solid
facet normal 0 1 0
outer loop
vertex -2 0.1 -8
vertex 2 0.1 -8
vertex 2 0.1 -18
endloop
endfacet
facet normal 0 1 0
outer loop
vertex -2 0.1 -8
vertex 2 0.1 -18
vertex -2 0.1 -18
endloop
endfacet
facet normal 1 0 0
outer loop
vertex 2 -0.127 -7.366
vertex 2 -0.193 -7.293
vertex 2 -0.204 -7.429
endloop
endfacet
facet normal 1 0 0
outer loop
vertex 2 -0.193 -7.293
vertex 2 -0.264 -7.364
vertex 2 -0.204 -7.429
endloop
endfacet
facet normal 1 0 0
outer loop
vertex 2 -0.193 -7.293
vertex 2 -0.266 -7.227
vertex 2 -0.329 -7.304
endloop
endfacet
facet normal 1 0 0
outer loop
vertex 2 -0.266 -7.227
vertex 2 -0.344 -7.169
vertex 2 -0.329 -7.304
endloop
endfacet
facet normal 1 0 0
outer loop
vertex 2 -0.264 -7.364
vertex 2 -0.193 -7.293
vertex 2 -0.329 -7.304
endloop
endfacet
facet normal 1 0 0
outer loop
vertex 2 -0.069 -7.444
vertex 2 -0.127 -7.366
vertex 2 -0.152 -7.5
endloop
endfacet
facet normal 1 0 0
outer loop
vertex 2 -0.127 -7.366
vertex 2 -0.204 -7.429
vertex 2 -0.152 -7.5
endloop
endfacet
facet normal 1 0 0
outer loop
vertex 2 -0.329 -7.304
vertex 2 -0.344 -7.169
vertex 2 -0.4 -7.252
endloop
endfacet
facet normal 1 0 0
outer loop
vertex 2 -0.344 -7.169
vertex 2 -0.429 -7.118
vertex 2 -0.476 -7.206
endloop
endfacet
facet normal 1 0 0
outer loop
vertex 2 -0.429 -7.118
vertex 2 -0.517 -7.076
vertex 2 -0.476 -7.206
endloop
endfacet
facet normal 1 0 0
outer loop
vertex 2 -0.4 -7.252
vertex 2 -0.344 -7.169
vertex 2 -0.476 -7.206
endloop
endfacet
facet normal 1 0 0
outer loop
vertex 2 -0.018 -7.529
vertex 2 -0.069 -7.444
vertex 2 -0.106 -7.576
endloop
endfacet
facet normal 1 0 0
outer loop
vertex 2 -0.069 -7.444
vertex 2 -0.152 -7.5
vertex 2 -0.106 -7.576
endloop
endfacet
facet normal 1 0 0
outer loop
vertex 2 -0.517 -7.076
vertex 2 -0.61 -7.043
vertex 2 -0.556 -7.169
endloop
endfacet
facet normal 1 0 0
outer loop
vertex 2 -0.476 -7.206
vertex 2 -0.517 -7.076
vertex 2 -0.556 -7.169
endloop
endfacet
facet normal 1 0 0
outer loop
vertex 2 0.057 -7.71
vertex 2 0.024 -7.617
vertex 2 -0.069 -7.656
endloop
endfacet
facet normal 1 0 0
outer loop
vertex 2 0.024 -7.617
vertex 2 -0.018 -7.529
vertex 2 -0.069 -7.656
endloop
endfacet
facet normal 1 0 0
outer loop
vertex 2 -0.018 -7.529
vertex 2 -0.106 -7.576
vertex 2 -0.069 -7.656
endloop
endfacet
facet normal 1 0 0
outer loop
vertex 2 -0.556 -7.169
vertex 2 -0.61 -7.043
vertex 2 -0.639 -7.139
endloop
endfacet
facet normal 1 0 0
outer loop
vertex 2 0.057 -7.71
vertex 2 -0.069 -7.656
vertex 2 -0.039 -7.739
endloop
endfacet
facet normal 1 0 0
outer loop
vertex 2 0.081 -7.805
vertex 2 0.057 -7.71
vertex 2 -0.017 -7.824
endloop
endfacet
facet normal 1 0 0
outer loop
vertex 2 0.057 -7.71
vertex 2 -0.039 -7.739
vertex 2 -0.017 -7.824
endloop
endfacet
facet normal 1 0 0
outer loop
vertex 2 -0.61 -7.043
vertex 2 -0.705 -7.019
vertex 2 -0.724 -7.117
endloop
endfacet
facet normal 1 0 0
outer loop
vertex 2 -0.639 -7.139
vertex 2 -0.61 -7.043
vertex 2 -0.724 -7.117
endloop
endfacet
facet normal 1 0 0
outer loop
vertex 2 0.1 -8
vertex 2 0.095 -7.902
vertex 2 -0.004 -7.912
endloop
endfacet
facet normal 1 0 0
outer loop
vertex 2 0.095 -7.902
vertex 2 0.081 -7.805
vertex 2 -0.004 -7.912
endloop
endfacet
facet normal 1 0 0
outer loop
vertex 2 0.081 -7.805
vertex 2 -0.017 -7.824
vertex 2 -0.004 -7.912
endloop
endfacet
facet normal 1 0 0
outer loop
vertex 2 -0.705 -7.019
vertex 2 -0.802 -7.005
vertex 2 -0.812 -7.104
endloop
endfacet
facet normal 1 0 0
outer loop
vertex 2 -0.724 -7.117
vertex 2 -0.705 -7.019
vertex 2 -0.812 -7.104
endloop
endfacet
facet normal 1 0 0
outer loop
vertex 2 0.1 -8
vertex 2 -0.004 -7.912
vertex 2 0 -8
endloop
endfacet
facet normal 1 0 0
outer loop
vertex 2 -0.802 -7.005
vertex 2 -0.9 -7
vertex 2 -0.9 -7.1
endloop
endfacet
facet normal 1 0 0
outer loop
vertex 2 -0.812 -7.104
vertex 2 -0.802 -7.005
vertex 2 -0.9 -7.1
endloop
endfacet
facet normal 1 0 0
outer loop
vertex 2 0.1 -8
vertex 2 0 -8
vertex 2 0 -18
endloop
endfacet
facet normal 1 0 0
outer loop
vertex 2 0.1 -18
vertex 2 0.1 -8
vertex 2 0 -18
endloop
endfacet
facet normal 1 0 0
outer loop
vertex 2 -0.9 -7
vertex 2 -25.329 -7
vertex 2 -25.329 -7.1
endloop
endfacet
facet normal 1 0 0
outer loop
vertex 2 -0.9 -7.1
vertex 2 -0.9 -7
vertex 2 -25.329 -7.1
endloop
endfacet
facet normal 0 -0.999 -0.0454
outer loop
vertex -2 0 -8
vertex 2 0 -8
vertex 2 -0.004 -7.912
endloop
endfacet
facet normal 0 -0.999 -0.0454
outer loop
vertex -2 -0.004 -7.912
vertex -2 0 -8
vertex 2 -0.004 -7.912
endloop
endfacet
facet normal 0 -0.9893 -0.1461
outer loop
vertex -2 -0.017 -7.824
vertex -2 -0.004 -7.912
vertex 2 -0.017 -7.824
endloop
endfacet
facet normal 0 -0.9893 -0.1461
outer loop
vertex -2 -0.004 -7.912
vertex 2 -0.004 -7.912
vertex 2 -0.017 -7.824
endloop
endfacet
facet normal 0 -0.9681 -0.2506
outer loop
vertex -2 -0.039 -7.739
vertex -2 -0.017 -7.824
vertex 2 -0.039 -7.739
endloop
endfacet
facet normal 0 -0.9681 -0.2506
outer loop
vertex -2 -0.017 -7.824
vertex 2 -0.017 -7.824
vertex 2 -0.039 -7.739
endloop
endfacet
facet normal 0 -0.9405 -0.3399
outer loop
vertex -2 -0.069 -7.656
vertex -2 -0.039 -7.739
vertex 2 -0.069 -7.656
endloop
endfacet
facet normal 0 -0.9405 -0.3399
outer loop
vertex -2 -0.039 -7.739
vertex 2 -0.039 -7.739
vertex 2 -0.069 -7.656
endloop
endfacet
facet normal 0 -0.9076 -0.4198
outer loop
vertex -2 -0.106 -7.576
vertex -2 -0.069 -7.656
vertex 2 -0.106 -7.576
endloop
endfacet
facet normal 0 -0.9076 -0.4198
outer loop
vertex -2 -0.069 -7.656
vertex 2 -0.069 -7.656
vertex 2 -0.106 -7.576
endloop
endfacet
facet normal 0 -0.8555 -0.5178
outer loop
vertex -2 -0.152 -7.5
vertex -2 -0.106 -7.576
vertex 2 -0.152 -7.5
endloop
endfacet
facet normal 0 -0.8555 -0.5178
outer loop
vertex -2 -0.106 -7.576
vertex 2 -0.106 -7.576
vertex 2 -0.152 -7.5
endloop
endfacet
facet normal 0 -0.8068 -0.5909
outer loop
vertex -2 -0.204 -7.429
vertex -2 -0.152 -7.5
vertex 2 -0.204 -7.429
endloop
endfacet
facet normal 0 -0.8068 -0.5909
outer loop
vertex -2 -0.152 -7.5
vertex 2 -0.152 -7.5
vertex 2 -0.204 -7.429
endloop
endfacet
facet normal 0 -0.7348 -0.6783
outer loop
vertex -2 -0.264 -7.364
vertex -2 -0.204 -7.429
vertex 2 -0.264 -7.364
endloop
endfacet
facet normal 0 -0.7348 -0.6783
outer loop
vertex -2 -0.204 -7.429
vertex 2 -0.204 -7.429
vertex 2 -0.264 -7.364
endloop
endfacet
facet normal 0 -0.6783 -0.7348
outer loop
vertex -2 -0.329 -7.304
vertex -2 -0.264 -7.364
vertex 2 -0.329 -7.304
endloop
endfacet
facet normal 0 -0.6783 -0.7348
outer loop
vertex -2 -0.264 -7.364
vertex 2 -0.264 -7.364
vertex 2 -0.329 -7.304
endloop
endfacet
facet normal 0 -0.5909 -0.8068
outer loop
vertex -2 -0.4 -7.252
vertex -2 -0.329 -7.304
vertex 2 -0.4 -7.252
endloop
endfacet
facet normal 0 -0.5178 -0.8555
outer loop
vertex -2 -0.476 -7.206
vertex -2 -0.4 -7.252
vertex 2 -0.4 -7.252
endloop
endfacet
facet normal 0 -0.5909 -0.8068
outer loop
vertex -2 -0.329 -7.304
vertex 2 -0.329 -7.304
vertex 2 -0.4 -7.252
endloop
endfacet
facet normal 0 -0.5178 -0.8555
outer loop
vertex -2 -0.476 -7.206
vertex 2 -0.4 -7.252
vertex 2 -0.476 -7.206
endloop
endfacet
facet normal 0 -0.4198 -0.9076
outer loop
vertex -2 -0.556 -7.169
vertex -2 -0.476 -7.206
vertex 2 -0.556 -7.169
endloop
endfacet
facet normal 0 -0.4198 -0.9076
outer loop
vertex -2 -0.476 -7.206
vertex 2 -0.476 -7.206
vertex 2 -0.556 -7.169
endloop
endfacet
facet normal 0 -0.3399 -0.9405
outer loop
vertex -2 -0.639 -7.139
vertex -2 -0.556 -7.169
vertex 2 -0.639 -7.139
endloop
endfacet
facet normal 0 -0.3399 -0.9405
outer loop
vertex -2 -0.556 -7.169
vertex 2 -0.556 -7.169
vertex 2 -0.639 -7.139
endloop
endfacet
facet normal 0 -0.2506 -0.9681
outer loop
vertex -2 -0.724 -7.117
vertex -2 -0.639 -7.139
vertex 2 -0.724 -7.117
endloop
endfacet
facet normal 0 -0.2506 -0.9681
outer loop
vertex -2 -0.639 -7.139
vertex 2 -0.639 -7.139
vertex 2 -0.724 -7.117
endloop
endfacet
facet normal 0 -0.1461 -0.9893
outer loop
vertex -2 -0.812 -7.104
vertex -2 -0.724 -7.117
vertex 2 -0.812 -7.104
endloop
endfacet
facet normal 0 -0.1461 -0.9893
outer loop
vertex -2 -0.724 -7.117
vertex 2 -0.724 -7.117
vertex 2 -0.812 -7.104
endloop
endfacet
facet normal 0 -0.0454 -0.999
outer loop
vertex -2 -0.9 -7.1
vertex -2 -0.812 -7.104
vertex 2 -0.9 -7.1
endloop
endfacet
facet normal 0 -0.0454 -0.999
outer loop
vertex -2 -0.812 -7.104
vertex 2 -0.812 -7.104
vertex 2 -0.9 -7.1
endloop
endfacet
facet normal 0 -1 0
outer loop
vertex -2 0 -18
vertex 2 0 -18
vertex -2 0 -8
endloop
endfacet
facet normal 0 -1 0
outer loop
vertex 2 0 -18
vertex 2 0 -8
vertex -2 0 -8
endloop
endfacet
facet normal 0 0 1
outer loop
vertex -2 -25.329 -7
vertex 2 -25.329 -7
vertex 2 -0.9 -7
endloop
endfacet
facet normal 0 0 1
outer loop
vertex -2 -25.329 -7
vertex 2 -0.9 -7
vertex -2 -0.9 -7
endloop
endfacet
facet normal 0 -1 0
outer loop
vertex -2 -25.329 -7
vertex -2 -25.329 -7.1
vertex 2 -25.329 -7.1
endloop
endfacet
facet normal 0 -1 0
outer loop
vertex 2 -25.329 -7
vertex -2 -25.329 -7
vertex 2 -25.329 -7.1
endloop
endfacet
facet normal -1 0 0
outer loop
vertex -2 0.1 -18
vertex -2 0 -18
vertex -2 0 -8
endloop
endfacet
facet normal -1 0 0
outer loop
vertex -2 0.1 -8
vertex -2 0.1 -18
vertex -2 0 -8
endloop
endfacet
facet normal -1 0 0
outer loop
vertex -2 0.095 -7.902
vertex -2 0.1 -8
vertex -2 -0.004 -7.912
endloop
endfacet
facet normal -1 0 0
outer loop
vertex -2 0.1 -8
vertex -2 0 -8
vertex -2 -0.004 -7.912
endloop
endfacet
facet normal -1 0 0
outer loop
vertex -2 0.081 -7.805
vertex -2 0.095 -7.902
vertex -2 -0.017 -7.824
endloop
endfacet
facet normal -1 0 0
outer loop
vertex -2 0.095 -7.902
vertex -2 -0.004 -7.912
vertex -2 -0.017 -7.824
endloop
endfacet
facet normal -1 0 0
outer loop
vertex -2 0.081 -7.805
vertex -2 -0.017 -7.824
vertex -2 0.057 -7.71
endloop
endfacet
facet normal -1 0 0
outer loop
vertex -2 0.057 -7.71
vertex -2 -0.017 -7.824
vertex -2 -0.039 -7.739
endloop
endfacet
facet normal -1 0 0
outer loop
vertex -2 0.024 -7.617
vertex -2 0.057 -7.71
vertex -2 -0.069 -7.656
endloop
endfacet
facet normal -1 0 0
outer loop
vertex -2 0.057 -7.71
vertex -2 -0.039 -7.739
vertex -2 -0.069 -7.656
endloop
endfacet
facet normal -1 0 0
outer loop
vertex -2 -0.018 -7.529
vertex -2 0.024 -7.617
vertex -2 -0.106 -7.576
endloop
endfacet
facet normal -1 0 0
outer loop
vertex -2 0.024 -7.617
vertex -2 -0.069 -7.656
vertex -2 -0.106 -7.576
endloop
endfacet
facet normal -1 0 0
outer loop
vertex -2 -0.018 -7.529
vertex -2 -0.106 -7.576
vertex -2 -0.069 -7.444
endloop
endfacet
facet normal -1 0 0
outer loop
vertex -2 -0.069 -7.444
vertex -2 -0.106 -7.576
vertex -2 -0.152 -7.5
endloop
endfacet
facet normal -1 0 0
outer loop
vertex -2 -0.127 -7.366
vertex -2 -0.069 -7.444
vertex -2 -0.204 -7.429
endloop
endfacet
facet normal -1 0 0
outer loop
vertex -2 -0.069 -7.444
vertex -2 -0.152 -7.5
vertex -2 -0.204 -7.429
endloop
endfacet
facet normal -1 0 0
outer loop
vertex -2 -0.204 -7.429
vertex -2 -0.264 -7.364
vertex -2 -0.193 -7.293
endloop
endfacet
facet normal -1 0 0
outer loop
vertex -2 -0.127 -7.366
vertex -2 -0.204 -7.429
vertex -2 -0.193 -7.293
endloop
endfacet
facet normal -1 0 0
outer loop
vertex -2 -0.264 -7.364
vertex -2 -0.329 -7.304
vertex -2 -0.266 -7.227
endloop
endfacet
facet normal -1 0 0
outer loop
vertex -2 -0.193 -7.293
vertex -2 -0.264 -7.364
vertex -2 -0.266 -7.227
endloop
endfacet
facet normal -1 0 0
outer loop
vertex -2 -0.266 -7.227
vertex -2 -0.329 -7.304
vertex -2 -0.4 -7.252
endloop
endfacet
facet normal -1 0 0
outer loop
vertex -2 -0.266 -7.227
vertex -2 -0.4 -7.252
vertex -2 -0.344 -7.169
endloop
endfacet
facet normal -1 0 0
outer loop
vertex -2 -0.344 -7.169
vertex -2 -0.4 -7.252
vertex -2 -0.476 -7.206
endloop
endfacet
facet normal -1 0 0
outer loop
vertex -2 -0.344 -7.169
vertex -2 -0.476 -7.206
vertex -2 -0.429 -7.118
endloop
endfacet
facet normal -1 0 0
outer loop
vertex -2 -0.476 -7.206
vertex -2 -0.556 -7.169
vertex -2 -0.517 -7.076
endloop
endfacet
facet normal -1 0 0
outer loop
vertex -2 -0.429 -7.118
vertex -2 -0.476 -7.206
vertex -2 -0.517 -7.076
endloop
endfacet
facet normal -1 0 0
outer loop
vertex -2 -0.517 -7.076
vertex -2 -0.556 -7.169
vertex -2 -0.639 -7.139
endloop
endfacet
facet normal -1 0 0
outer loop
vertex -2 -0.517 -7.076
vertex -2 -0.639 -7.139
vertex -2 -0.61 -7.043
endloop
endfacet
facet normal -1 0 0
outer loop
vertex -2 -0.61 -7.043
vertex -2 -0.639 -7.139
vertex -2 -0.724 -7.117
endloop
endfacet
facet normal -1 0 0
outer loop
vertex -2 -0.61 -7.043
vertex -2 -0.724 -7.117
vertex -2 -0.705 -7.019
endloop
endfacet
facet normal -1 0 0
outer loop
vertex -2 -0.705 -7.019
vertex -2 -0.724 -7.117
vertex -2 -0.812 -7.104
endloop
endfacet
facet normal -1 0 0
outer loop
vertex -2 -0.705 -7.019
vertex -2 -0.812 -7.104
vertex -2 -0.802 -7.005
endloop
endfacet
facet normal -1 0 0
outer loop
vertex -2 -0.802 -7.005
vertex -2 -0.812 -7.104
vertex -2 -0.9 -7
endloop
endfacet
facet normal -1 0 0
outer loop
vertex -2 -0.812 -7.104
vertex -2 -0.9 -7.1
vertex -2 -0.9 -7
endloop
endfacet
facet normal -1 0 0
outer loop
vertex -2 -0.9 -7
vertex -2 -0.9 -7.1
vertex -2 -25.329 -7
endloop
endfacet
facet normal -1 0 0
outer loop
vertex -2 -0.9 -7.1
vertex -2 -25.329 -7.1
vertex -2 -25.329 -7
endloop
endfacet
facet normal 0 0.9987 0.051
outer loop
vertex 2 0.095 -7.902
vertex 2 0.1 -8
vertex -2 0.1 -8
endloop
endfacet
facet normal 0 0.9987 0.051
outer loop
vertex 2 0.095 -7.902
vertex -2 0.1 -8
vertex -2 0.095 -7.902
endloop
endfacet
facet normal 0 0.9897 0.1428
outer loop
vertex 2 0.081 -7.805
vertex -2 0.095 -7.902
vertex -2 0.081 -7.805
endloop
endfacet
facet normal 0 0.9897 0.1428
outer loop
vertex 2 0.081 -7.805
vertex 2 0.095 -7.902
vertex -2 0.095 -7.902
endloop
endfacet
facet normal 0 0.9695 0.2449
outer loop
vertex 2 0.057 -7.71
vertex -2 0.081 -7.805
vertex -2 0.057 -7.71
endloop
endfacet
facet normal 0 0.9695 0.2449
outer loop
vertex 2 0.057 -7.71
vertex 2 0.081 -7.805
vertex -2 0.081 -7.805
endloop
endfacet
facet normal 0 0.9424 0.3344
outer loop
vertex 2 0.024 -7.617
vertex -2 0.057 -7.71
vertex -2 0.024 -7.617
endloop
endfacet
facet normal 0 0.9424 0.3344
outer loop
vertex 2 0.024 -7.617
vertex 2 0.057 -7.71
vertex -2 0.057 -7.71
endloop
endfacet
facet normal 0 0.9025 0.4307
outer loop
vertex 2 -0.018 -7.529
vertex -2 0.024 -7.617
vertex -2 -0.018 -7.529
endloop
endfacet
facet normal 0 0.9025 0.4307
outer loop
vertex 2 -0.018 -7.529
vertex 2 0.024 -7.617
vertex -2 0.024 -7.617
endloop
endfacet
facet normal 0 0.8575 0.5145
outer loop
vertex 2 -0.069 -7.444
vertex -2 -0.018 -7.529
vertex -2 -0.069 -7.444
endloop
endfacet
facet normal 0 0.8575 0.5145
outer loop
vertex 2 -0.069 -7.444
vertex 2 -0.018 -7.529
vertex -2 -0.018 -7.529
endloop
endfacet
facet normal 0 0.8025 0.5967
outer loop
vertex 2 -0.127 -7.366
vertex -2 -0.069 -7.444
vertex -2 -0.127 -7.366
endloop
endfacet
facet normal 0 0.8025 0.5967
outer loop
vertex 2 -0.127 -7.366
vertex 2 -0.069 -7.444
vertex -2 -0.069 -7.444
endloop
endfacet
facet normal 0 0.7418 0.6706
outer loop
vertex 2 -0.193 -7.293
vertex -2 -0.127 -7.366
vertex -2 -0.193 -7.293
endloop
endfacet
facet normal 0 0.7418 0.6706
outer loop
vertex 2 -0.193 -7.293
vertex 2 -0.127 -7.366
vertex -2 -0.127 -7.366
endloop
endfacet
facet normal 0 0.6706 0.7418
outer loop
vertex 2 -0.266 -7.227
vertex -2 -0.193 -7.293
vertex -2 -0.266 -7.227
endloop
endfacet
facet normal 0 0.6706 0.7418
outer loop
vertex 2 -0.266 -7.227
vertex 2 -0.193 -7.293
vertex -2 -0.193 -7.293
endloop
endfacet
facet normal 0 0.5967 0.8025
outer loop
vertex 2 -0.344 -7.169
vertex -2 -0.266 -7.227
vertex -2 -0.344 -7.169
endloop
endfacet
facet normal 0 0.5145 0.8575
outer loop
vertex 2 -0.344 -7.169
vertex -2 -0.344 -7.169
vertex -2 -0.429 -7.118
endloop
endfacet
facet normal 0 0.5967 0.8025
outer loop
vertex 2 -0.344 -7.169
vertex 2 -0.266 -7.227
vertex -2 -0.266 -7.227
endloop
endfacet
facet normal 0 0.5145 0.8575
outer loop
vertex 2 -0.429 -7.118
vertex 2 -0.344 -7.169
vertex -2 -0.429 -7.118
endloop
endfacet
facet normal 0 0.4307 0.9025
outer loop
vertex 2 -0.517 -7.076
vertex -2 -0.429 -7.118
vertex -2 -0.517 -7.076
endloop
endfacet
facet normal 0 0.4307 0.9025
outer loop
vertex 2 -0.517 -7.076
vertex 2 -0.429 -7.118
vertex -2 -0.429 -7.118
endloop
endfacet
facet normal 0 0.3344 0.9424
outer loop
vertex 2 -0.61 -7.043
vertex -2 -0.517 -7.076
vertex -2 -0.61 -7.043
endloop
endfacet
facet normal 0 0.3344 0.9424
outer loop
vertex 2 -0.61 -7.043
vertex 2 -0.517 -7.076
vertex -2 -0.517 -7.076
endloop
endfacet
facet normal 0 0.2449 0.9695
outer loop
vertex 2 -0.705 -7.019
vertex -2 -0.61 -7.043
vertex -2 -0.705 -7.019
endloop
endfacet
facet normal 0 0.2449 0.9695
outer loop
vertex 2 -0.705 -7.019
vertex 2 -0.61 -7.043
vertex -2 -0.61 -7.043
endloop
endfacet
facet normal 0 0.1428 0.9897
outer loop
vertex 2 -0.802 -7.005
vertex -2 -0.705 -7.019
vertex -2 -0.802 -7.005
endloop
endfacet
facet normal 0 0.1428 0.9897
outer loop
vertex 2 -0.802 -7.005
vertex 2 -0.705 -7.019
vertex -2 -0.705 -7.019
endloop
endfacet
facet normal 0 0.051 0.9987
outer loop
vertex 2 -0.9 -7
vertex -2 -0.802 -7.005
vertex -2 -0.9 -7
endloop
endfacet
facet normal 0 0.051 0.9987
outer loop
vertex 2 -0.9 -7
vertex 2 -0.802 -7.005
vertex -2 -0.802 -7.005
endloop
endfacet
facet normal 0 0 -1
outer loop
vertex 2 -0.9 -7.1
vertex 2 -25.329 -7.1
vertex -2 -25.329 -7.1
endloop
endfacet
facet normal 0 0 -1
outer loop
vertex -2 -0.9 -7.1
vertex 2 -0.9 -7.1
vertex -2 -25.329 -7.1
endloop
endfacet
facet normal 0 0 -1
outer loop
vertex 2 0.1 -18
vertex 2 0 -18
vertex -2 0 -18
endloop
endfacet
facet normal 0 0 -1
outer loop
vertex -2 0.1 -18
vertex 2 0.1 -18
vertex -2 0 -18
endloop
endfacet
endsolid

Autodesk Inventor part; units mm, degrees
ref_plane "YZ Plane" through (0, 0, 0) normal (1, 0, 0) x (0, 1, 0)
ref_plane "XZ Plane" through (0, 0, 0) normal (0, 1, 0) x (-1, 0, 0)
ref_plane "XY Plane" through (0, 0, 0) normal (0, 0, 1) x (1, 0, 0)
sketch "Sketch1" plane through (0, 0, 0) normal (0, 1, 0) x (-1, 0, 0)
  line L0 (-2, 18) -> (-2, -18)
  line L1 (-2, -18) -> (2, -18)
  line L2 (2, -18) -> (2, 18)
  line L3 (2, 18) -> (-2, 18)
  line L4 (-2, 18) -> (2, -18) construction
  line L5 (-2, -18) -> (2, 18) construction
  point P0 (0, 0)
extrude "Extrusion1" add sketch "Sketch1" along normal blind 0.1
sketch "Sketch2" plane through (0, 0.1, 0) normal (0, 1, 0) x (1, 0, 0)
  line L0 (2, -18) -> (2, 18) projected
  line L1 (2, 18) -> (-2, 18) projected
  line L2 (-2, 18) -> (-2, -18) projected
  line L3 (-2, 8) -> (2, 8)
  point P0 (0, 0)
  dimension "d2" = 10
bend part "Bend Part1" radius 1 angle 90 line through (-2, 0.1, -8) along (1, 0, 0) centre toward (0, -1, 0) moving side (0, 0, 1) both sides no
properties part number "PIElectrodes"
